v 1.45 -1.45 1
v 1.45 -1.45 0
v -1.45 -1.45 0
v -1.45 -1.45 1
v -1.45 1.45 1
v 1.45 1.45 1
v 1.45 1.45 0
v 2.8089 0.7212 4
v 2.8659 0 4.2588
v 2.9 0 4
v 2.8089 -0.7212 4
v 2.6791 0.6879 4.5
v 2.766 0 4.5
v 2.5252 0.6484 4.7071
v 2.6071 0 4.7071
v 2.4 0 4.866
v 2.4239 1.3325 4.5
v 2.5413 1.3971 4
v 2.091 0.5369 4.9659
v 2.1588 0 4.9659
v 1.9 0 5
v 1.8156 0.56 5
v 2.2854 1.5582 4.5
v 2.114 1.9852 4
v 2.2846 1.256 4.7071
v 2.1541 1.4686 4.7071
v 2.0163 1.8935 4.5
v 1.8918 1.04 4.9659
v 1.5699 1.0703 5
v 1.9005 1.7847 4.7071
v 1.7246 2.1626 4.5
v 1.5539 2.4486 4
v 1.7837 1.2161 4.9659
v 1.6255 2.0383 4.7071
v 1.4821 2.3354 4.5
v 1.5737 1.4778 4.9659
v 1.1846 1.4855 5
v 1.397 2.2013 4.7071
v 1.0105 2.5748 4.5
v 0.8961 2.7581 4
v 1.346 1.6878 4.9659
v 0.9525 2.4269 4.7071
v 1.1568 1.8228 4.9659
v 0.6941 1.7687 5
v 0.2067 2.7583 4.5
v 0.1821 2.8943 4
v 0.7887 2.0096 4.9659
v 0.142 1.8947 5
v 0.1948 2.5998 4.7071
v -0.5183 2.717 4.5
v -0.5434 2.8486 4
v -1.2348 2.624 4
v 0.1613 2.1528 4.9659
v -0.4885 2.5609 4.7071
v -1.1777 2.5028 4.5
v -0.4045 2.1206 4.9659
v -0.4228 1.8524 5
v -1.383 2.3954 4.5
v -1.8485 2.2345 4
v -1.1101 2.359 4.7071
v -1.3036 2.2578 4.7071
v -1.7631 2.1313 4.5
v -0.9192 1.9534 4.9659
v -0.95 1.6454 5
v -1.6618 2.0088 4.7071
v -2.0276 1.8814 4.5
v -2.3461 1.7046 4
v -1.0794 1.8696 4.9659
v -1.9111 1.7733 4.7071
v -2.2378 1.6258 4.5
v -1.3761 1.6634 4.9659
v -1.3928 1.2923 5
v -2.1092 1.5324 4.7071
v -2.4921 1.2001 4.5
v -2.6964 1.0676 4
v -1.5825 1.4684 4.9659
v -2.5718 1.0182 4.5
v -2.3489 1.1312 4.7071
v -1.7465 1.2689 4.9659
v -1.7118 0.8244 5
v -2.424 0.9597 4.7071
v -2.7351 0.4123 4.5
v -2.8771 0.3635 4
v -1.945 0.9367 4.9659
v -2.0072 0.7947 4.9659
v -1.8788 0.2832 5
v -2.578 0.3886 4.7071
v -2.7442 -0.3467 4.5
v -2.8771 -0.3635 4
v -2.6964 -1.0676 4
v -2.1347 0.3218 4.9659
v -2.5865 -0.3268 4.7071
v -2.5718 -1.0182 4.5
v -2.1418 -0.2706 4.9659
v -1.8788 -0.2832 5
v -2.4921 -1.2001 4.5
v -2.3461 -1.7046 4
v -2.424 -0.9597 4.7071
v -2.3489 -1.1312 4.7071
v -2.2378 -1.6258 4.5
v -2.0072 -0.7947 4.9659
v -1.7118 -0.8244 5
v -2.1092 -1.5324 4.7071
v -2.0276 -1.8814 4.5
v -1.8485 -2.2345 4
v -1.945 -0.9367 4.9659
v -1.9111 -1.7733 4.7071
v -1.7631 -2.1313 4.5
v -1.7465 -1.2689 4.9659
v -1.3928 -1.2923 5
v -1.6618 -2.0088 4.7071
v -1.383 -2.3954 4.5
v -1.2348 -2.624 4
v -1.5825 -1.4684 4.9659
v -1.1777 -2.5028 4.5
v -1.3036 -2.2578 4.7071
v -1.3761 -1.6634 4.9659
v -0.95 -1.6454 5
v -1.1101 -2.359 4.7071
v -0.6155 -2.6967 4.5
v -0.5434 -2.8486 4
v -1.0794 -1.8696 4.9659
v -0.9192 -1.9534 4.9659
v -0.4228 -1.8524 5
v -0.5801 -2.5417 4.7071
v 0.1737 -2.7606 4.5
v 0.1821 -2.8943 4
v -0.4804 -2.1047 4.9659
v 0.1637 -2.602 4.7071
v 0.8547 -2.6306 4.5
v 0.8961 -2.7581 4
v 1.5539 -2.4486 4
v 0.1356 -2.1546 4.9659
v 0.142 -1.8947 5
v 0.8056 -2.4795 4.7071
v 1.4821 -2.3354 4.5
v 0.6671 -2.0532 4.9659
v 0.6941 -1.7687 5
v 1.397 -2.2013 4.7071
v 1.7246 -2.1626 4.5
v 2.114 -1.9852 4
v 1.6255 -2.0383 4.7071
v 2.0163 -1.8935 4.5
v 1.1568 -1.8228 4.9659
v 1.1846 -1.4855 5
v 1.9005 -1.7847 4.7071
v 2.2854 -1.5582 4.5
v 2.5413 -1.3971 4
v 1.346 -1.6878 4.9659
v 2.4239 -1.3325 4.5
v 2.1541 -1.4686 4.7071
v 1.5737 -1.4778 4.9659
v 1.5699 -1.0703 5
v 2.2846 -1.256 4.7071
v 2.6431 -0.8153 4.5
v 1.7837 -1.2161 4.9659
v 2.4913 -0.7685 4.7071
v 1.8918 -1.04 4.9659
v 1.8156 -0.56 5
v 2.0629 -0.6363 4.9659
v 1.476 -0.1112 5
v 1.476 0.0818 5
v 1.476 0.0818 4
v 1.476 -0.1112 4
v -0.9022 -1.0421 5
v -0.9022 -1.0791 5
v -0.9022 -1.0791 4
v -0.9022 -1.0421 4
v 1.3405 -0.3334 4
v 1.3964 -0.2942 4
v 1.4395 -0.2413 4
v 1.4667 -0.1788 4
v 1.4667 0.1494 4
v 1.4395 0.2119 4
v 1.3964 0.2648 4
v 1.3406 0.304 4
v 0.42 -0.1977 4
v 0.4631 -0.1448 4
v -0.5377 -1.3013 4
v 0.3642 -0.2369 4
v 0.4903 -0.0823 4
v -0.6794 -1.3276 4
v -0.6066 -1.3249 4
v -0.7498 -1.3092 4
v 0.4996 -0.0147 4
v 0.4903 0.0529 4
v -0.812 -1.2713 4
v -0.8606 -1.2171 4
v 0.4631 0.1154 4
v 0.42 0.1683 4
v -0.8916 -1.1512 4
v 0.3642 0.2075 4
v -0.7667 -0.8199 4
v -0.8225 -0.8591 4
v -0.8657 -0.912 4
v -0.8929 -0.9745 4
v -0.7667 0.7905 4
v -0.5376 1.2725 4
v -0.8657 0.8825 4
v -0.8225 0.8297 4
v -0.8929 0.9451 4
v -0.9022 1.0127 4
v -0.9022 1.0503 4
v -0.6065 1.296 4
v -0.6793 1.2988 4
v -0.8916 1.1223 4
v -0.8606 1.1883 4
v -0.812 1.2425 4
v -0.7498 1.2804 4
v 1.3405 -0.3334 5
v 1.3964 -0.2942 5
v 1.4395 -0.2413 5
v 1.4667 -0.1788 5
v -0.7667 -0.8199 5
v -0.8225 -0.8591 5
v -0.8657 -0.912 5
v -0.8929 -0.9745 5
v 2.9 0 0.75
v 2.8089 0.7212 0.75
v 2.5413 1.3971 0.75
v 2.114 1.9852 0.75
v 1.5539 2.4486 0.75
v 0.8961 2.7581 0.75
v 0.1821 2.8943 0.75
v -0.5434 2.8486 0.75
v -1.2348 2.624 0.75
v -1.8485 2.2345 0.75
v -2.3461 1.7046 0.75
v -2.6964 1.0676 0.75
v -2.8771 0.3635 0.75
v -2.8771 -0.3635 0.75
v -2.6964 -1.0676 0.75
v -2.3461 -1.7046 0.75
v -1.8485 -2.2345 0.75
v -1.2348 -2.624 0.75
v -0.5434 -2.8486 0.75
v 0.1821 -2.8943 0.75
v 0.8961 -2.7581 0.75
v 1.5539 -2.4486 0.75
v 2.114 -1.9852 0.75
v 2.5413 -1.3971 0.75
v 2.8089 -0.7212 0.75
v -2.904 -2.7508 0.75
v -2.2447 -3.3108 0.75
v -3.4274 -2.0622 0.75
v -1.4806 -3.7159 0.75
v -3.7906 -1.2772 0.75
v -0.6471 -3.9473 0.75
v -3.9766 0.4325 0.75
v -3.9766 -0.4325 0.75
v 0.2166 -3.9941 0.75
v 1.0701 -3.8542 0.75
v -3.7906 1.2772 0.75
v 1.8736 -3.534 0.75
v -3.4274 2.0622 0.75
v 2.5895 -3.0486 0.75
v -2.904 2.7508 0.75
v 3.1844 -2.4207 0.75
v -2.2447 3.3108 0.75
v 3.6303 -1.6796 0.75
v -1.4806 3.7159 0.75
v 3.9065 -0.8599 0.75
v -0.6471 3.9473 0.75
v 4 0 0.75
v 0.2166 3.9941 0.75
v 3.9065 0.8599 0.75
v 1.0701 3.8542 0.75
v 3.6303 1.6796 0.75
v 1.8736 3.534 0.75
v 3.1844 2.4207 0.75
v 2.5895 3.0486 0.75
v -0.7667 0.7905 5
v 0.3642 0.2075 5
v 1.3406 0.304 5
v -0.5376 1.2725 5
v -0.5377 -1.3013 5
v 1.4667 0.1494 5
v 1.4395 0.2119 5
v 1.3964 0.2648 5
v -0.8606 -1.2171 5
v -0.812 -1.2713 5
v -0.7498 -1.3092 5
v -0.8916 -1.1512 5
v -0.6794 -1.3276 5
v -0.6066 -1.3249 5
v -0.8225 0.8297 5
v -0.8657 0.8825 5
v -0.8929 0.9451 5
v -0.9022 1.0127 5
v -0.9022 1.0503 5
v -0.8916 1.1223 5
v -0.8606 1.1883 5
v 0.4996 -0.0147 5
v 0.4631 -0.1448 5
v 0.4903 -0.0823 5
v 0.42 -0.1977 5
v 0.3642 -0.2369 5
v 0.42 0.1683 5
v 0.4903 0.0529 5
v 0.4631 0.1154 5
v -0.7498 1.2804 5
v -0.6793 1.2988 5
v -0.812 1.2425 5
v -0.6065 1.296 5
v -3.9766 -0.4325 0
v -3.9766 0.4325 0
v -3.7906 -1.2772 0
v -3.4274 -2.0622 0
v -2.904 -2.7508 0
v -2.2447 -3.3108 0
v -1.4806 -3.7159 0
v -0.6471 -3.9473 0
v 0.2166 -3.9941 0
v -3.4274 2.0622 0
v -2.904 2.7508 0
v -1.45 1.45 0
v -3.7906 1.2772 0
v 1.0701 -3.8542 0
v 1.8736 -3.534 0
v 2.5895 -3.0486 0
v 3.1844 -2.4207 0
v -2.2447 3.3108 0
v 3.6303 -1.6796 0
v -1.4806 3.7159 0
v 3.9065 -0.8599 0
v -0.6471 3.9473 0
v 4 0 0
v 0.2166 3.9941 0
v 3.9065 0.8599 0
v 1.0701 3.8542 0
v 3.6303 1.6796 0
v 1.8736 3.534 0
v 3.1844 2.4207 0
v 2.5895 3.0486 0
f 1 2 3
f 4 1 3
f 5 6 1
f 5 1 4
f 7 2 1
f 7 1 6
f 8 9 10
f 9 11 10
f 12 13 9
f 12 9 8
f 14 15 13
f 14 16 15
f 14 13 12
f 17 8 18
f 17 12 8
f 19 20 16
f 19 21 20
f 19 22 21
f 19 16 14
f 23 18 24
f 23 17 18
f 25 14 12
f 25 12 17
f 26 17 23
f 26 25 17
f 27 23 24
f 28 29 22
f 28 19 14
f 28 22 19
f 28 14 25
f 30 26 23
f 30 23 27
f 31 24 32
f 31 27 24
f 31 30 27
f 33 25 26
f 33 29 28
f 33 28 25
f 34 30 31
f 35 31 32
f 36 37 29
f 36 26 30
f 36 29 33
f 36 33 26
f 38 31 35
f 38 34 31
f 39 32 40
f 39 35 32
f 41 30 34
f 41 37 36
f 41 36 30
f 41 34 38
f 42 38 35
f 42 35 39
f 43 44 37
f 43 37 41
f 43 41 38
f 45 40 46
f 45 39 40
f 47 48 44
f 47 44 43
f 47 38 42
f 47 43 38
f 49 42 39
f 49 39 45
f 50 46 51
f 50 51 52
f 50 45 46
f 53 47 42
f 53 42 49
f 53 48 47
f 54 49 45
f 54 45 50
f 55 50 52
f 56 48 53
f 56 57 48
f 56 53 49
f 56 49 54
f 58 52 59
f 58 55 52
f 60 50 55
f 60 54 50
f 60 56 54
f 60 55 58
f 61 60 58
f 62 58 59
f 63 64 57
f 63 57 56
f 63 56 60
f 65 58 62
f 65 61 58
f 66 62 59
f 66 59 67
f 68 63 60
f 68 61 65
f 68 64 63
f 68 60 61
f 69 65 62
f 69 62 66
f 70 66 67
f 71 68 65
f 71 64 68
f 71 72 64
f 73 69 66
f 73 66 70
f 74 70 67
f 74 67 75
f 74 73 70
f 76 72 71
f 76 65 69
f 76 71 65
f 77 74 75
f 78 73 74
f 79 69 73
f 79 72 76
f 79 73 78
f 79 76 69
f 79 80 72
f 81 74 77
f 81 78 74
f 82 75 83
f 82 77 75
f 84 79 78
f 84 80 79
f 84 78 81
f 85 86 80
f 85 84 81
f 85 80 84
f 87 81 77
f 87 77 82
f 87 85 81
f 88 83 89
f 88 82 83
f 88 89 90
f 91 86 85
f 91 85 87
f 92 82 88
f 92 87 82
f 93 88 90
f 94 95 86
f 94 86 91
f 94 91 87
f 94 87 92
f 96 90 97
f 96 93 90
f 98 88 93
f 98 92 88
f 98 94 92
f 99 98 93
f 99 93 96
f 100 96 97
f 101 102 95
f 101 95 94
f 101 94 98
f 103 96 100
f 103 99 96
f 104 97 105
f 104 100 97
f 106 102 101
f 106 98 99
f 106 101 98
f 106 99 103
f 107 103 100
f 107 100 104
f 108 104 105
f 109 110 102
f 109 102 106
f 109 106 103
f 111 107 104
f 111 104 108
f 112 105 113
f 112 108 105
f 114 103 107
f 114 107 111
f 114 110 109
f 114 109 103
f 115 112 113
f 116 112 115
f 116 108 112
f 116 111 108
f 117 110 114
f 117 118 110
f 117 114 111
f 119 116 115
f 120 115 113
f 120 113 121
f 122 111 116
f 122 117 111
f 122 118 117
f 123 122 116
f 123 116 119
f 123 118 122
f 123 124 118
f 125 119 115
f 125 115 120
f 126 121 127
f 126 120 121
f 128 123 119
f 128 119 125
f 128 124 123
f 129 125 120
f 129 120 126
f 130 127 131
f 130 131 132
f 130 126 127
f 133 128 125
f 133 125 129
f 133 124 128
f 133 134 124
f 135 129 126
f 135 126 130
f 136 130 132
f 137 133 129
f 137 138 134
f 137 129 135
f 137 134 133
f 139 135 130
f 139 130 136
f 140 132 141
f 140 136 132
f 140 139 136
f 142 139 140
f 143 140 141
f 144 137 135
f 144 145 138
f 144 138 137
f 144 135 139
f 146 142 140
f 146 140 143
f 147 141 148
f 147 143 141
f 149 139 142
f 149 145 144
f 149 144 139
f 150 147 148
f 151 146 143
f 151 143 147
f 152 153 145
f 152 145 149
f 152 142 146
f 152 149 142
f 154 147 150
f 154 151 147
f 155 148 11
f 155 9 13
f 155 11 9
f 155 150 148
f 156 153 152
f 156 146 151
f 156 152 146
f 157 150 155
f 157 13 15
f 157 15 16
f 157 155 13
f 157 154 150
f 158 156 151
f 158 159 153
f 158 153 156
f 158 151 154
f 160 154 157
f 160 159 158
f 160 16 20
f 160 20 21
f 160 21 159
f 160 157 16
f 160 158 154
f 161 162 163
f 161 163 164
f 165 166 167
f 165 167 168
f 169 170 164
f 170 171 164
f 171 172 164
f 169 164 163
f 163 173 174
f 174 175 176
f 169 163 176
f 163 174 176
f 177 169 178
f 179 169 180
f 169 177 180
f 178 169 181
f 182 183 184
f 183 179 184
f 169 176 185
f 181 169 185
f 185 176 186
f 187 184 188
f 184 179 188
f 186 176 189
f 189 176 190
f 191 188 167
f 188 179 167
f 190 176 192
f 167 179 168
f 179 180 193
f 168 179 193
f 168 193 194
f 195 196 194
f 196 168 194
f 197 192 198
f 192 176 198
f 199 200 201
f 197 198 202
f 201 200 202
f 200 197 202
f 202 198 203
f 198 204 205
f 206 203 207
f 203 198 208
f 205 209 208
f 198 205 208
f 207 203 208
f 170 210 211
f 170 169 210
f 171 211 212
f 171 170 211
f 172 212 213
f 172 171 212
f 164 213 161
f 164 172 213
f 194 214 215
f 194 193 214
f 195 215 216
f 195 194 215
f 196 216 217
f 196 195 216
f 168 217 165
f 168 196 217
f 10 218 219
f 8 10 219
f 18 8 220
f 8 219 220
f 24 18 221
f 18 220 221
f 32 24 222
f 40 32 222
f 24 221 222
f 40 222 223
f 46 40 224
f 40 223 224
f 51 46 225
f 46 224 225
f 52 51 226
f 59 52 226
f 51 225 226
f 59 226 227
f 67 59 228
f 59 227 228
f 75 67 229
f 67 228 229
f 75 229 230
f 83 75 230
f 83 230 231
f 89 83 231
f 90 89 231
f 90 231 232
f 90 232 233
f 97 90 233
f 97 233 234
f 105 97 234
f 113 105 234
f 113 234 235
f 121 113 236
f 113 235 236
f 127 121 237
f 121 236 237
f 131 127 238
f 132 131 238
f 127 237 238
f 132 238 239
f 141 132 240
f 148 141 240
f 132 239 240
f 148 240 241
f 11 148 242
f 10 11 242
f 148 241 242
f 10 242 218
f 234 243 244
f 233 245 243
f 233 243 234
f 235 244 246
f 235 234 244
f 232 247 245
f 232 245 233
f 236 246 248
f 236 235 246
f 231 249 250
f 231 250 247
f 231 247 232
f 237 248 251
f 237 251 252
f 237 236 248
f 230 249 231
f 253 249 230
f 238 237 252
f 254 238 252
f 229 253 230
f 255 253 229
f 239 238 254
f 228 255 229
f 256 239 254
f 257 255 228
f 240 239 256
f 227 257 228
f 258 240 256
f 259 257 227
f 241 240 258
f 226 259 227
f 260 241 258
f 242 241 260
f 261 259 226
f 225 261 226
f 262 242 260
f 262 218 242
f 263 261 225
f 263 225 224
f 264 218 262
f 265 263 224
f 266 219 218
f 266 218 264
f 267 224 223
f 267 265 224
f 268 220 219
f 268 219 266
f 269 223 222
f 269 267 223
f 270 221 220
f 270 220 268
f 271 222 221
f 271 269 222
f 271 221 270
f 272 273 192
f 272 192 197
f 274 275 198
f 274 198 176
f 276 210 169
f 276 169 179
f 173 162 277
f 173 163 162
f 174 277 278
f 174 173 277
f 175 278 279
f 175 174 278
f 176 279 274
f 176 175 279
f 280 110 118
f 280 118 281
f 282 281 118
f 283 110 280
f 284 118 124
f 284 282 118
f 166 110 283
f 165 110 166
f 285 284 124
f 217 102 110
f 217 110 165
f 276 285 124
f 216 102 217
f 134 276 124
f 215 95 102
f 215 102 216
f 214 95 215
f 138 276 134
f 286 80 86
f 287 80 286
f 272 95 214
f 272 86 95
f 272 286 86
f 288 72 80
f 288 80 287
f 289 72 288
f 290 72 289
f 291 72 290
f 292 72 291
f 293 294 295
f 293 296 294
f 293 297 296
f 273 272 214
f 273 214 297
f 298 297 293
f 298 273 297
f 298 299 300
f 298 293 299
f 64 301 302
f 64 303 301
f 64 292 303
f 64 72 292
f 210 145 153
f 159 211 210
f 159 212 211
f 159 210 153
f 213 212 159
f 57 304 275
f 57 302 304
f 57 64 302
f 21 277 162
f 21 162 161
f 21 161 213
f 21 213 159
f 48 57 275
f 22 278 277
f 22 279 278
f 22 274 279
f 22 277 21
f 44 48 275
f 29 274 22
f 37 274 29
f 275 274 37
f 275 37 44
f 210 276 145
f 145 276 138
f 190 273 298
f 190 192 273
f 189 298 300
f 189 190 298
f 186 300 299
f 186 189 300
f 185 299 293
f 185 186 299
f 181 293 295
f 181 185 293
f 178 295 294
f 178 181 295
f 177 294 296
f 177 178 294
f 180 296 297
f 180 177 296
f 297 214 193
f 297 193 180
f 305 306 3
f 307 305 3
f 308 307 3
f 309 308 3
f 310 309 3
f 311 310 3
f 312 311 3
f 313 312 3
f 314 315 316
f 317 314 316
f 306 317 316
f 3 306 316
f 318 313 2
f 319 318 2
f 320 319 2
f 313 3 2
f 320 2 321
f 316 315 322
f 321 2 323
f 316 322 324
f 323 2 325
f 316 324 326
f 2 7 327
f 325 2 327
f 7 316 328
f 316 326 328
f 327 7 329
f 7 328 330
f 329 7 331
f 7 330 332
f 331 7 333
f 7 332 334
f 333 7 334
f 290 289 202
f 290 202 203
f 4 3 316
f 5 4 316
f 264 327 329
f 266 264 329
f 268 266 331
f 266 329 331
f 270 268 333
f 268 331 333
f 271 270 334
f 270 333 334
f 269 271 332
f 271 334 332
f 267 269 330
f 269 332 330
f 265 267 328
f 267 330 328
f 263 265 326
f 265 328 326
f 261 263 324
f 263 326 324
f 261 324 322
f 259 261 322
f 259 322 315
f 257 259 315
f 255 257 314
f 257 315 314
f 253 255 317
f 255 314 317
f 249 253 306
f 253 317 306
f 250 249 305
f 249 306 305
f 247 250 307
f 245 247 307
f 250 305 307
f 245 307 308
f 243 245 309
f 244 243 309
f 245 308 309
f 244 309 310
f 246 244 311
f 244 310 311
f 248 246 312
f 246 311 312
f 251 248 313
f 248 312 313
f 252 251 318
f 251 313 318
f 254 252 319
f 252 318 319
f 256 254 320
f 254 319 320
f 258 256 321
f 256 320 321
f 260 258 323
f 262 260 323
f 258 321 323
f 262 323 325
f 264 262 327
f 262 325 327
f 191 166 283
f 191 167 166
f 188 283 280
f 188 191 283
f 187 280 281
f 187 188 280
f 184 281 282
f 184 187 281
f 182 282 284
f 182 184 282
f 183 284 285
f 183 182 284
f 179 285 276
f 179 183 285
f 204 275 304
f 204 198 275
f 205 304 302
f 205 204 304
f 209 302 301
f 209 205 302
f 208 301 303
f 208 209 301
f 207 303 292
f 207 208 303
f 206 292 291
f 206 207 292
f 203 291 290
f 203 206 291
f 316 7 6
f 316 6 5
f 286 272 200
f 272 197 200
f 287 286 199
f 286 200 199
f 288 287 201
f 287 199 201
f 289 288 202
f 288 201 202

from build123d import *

# Parameters (mm, degrees)
SZKIC1_R                    = 4
DODANIE_WYCI_GNI_CIE1_DEPTH = 0.75
SZKIC2_R                    = 2.9
DODANIE_WYCI_GNI_CIE2_DEPTH = 4.25
SZKIC3_W                    = 2.5
SZKIC3_H                    = 2.5
WYTNIJ_WYCI_GNI_CIE1_DEPTH  = 1
ZAOKR_GLENIE2_R             = 1
SZKIC4_W                    = 2.9
SZKIC4_H                    = 2.9
WYTNIJ_WYCI_GNI_CIE2_DEPTH  = 1
WYTNIJ_WYCI_GNI_CIE3_DEPTH  = 1
ZAOKR_GLENIE3_R             = 0.25


with BuildPart() as part:
    # Szkic1 → Dodanie-wyciągnięcie1 (new body)
    with BuildSketch(Plane.XY):
        Circle(SZKIC1_R)
    extrude(amount=DODANIE_WYCI_GNI_CIE1_DEPTH)

    # Szkic2 → Dodanie-wyciągnięcie2 (add)
    with BuildSketch(Plane.XY.offset(0.75)):
        Circle(SZKIC2_R)
    extrude(amount=DODANIE_WYCI_GNI_CIE2_DEPTH)

    # Szkic3 → Wytnij-wyciągnięcie1 (cut)
    with BuildSketch(Plane(origin=(0, 0, 0), x_dir=(-1, 0, 0), z_dir=(0, 0, -1))):
        Rectangle(SZKIC3_W, SZKIC3_H)
    extrude(amount=-WYTNIJ_WYCI_GNI_CIE1_DEPTH, mode=Mode.SUBTRACT)

    # Zaokrąglenie2
    zaokr_glenie2_edges = [part.edges().sort_by_distance(p)[0] for p in [
        (-2.9, 0, 5),
    ]]
    fillet(zaokr_glenie2_edges, radius=ZAOKR_GLENIE2_R)

    # Szkic4 → Wytnij-wyciągnięcie2 (cut)
    with BuildSketch(Plane(origin=(0, 0, 0), x_dir=(-1, 0, 0), z_dir=(0, 0, -1))):
        Rectangle(SZKIC4_W, SZKIC4_H)
    extrude(amount=-WYTNIJ_WYCI_GNI_CIE2_DEPTH, mode=Mode.SUBTRACT)

    # Szkic5 → Wytnij-wyciągnięcie3 (cut)
    with BuildSketch(Plane.XY.offset(5)):
        Polygon((-0.902184432, 0.860277554), (-0.902184432, 1.46043781), (1.476020697, 0.234175791), (1.476020697, -0.263620684), (-0.902184432, -1.489181581), (-0.902184432, -0.889722446), (0.795231434, -0.014722446), align=None)
    extrude(amount=-WYTNIJ_WYCI_GNI_CIE3_DEPTH, mode=Mode.SUBTRACT)

    # Zaokrąglenie3
    zaokr_glenie3_edges = [part.edges().sort_by_distance(p)[0] for p in [
        (0.795231434, -0.014722446, 4.5),
        (-0.902184432, 0.860277554, 4.5),
        (-0.902184432, 1.46043781, 4.5),
        (1.476020697, 0.234175791, 4.5),
        (1.476020697, -0.263620684, 4.5),
        (-0.902184432, -1.489181581, 4.5),
        (-0.902184432, -0.889722446, 4.5),
    ]]
    fillet(zaokr_glenie3_edges, radius=ZAOKR_GLENIE3_R)


solid = part.part
